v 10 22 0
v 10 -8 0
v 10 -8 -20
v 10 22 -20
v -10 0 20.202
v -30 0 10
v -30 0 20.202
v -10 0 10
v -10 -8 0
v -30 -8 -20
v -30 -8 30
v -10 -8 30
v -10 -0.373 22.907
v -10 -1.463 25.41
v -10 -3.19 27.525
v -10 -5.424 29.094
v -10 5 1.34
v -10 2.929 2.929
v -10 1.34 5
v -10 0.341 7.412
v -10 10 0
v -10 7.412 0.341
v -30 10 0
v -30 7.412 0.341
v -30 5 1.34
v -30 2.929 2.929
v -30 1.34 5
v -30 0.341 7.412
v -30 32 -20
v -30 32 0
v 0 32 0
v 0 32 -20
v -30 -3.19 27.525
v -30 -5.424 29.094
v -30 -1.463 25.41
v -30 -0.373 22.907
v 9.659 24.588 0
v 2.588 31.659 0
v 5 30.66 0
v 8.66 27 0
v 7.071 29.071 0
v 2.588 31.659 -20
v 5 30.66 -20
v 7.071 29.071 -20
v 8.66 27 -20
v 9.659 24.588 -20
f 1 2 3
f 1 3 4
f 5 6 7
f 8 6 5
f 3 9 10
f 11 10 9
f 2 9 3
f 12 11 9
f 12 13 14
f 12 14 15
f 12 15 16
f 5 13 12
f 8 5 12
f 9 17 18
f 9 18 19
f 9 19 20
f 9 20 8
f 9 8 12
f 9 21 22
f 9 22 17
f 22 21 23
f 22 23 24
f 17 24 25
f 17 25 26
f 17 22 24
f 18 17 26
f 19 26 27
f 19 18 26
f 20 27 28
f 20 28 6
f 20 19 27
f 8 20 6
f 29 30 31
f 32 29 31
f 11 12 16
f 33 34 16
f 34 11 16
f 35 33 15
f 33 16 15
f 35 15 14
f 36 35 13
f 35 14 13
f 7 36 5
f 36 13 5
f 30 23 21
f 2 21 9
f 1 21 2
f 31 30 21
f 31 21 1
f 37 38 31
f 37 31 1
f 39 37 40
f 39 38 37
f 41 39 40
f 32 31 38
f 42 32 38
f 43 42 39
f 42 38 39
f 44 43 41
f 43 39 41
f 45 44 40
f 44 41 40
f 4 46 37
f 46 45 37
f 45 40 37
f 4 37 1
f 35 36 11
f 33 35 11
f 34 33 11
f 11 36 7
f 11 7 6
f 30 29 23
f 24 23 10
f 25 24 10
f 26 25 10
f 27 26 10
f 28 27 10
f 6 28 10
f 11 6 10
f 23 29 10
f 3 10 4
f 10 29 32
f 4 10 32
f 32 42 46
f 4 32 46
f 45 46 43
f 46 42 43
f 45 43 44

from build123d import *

# Parameters (mm, degrees)
SKETCH1_W           = 20
SKETCH1_H           = 8
BOSS_EXTRUDE1_DEPTH = 30
SKETCH2_W           = 40
SKETCH2_H           = 40
BOSS_EXTRUDE2_DEPTH = 20
FILLET1_R           = 10


with BuildPart() as part:
    # Sketch1 → Boss-Extrude1 (new body)
    with BuildSketch(Plane.XY):
        with Locations((-20, -4)):
            Rectangle(SKETCH1_W, SKETCH1_H)
    extrude(amount=BOSS_EXTRUDE1_DEPTH)

    # Sketch2 → Boss-Extrude2 (add)
    with BuildSketch(Plane.XY):
        with Locations((-10, 12)):
            Rectangle(SKETCH2_W, SKETCH2_H)
    extrude(amount=-BOSS_EXTRUDE2_DEPTH)

    # Fillet1
    # the kernel refuses this fillet: 10 mm, written as the material it adds along each edge
    with BuildSketch(Plane(origin=(-10, 0, 0), x_dir=(0, 1, 0), z_dir=(-1, 0, 0))) as fillet1_piece_1:
        with BuildLine():
            CenterArc((FILLET1_R, -FILLET1_R), FILLET1_R, 90, 90)
            Line((0, -FILLET1_R), (0, 0))
            Line((0, 0), (FILLET1_R, 0))
        make_face()
    extrude(amount=20)
    # the kernel refuses this fillet: 10 mm, written as the material it takes off along each edge
    with BuildSketch(Plane(origin=(10, 32, 25), x_dir=(-1, 0, 0), z_dir=(0, 0, -1))) as fillet1_2_piece_1:
        with BuildLine():
            CenterArc((FILLET1_R, -FILLET1_R), FILLET1_R, 90, 90)
            Line((0, -FILLET1_R), (0, 0))
            Line((0, 0), (FILLET1_R, 0))
        make_face()
    extrude(amount=70, mode=Mode.SUBTRACT)
    with BuildSketch(Plane(origin=(14.494897428, 0, 30), x_dir=(0, 0, -1), z_dir=(-1, 0, 0))) as fillet1_2_piece_2:
        with BuildLine():
            CenterArc((9.797958971, 10), FILLET1_R, 191.536959033, 78.463040967)
            Line((0, 8), (0, 0))
            Line((0, 0), (9.797958971, 0))
        make_face()
    extrude(amount=68.989794856, mode=Mode.SUBTRACT)


solid = part.part
